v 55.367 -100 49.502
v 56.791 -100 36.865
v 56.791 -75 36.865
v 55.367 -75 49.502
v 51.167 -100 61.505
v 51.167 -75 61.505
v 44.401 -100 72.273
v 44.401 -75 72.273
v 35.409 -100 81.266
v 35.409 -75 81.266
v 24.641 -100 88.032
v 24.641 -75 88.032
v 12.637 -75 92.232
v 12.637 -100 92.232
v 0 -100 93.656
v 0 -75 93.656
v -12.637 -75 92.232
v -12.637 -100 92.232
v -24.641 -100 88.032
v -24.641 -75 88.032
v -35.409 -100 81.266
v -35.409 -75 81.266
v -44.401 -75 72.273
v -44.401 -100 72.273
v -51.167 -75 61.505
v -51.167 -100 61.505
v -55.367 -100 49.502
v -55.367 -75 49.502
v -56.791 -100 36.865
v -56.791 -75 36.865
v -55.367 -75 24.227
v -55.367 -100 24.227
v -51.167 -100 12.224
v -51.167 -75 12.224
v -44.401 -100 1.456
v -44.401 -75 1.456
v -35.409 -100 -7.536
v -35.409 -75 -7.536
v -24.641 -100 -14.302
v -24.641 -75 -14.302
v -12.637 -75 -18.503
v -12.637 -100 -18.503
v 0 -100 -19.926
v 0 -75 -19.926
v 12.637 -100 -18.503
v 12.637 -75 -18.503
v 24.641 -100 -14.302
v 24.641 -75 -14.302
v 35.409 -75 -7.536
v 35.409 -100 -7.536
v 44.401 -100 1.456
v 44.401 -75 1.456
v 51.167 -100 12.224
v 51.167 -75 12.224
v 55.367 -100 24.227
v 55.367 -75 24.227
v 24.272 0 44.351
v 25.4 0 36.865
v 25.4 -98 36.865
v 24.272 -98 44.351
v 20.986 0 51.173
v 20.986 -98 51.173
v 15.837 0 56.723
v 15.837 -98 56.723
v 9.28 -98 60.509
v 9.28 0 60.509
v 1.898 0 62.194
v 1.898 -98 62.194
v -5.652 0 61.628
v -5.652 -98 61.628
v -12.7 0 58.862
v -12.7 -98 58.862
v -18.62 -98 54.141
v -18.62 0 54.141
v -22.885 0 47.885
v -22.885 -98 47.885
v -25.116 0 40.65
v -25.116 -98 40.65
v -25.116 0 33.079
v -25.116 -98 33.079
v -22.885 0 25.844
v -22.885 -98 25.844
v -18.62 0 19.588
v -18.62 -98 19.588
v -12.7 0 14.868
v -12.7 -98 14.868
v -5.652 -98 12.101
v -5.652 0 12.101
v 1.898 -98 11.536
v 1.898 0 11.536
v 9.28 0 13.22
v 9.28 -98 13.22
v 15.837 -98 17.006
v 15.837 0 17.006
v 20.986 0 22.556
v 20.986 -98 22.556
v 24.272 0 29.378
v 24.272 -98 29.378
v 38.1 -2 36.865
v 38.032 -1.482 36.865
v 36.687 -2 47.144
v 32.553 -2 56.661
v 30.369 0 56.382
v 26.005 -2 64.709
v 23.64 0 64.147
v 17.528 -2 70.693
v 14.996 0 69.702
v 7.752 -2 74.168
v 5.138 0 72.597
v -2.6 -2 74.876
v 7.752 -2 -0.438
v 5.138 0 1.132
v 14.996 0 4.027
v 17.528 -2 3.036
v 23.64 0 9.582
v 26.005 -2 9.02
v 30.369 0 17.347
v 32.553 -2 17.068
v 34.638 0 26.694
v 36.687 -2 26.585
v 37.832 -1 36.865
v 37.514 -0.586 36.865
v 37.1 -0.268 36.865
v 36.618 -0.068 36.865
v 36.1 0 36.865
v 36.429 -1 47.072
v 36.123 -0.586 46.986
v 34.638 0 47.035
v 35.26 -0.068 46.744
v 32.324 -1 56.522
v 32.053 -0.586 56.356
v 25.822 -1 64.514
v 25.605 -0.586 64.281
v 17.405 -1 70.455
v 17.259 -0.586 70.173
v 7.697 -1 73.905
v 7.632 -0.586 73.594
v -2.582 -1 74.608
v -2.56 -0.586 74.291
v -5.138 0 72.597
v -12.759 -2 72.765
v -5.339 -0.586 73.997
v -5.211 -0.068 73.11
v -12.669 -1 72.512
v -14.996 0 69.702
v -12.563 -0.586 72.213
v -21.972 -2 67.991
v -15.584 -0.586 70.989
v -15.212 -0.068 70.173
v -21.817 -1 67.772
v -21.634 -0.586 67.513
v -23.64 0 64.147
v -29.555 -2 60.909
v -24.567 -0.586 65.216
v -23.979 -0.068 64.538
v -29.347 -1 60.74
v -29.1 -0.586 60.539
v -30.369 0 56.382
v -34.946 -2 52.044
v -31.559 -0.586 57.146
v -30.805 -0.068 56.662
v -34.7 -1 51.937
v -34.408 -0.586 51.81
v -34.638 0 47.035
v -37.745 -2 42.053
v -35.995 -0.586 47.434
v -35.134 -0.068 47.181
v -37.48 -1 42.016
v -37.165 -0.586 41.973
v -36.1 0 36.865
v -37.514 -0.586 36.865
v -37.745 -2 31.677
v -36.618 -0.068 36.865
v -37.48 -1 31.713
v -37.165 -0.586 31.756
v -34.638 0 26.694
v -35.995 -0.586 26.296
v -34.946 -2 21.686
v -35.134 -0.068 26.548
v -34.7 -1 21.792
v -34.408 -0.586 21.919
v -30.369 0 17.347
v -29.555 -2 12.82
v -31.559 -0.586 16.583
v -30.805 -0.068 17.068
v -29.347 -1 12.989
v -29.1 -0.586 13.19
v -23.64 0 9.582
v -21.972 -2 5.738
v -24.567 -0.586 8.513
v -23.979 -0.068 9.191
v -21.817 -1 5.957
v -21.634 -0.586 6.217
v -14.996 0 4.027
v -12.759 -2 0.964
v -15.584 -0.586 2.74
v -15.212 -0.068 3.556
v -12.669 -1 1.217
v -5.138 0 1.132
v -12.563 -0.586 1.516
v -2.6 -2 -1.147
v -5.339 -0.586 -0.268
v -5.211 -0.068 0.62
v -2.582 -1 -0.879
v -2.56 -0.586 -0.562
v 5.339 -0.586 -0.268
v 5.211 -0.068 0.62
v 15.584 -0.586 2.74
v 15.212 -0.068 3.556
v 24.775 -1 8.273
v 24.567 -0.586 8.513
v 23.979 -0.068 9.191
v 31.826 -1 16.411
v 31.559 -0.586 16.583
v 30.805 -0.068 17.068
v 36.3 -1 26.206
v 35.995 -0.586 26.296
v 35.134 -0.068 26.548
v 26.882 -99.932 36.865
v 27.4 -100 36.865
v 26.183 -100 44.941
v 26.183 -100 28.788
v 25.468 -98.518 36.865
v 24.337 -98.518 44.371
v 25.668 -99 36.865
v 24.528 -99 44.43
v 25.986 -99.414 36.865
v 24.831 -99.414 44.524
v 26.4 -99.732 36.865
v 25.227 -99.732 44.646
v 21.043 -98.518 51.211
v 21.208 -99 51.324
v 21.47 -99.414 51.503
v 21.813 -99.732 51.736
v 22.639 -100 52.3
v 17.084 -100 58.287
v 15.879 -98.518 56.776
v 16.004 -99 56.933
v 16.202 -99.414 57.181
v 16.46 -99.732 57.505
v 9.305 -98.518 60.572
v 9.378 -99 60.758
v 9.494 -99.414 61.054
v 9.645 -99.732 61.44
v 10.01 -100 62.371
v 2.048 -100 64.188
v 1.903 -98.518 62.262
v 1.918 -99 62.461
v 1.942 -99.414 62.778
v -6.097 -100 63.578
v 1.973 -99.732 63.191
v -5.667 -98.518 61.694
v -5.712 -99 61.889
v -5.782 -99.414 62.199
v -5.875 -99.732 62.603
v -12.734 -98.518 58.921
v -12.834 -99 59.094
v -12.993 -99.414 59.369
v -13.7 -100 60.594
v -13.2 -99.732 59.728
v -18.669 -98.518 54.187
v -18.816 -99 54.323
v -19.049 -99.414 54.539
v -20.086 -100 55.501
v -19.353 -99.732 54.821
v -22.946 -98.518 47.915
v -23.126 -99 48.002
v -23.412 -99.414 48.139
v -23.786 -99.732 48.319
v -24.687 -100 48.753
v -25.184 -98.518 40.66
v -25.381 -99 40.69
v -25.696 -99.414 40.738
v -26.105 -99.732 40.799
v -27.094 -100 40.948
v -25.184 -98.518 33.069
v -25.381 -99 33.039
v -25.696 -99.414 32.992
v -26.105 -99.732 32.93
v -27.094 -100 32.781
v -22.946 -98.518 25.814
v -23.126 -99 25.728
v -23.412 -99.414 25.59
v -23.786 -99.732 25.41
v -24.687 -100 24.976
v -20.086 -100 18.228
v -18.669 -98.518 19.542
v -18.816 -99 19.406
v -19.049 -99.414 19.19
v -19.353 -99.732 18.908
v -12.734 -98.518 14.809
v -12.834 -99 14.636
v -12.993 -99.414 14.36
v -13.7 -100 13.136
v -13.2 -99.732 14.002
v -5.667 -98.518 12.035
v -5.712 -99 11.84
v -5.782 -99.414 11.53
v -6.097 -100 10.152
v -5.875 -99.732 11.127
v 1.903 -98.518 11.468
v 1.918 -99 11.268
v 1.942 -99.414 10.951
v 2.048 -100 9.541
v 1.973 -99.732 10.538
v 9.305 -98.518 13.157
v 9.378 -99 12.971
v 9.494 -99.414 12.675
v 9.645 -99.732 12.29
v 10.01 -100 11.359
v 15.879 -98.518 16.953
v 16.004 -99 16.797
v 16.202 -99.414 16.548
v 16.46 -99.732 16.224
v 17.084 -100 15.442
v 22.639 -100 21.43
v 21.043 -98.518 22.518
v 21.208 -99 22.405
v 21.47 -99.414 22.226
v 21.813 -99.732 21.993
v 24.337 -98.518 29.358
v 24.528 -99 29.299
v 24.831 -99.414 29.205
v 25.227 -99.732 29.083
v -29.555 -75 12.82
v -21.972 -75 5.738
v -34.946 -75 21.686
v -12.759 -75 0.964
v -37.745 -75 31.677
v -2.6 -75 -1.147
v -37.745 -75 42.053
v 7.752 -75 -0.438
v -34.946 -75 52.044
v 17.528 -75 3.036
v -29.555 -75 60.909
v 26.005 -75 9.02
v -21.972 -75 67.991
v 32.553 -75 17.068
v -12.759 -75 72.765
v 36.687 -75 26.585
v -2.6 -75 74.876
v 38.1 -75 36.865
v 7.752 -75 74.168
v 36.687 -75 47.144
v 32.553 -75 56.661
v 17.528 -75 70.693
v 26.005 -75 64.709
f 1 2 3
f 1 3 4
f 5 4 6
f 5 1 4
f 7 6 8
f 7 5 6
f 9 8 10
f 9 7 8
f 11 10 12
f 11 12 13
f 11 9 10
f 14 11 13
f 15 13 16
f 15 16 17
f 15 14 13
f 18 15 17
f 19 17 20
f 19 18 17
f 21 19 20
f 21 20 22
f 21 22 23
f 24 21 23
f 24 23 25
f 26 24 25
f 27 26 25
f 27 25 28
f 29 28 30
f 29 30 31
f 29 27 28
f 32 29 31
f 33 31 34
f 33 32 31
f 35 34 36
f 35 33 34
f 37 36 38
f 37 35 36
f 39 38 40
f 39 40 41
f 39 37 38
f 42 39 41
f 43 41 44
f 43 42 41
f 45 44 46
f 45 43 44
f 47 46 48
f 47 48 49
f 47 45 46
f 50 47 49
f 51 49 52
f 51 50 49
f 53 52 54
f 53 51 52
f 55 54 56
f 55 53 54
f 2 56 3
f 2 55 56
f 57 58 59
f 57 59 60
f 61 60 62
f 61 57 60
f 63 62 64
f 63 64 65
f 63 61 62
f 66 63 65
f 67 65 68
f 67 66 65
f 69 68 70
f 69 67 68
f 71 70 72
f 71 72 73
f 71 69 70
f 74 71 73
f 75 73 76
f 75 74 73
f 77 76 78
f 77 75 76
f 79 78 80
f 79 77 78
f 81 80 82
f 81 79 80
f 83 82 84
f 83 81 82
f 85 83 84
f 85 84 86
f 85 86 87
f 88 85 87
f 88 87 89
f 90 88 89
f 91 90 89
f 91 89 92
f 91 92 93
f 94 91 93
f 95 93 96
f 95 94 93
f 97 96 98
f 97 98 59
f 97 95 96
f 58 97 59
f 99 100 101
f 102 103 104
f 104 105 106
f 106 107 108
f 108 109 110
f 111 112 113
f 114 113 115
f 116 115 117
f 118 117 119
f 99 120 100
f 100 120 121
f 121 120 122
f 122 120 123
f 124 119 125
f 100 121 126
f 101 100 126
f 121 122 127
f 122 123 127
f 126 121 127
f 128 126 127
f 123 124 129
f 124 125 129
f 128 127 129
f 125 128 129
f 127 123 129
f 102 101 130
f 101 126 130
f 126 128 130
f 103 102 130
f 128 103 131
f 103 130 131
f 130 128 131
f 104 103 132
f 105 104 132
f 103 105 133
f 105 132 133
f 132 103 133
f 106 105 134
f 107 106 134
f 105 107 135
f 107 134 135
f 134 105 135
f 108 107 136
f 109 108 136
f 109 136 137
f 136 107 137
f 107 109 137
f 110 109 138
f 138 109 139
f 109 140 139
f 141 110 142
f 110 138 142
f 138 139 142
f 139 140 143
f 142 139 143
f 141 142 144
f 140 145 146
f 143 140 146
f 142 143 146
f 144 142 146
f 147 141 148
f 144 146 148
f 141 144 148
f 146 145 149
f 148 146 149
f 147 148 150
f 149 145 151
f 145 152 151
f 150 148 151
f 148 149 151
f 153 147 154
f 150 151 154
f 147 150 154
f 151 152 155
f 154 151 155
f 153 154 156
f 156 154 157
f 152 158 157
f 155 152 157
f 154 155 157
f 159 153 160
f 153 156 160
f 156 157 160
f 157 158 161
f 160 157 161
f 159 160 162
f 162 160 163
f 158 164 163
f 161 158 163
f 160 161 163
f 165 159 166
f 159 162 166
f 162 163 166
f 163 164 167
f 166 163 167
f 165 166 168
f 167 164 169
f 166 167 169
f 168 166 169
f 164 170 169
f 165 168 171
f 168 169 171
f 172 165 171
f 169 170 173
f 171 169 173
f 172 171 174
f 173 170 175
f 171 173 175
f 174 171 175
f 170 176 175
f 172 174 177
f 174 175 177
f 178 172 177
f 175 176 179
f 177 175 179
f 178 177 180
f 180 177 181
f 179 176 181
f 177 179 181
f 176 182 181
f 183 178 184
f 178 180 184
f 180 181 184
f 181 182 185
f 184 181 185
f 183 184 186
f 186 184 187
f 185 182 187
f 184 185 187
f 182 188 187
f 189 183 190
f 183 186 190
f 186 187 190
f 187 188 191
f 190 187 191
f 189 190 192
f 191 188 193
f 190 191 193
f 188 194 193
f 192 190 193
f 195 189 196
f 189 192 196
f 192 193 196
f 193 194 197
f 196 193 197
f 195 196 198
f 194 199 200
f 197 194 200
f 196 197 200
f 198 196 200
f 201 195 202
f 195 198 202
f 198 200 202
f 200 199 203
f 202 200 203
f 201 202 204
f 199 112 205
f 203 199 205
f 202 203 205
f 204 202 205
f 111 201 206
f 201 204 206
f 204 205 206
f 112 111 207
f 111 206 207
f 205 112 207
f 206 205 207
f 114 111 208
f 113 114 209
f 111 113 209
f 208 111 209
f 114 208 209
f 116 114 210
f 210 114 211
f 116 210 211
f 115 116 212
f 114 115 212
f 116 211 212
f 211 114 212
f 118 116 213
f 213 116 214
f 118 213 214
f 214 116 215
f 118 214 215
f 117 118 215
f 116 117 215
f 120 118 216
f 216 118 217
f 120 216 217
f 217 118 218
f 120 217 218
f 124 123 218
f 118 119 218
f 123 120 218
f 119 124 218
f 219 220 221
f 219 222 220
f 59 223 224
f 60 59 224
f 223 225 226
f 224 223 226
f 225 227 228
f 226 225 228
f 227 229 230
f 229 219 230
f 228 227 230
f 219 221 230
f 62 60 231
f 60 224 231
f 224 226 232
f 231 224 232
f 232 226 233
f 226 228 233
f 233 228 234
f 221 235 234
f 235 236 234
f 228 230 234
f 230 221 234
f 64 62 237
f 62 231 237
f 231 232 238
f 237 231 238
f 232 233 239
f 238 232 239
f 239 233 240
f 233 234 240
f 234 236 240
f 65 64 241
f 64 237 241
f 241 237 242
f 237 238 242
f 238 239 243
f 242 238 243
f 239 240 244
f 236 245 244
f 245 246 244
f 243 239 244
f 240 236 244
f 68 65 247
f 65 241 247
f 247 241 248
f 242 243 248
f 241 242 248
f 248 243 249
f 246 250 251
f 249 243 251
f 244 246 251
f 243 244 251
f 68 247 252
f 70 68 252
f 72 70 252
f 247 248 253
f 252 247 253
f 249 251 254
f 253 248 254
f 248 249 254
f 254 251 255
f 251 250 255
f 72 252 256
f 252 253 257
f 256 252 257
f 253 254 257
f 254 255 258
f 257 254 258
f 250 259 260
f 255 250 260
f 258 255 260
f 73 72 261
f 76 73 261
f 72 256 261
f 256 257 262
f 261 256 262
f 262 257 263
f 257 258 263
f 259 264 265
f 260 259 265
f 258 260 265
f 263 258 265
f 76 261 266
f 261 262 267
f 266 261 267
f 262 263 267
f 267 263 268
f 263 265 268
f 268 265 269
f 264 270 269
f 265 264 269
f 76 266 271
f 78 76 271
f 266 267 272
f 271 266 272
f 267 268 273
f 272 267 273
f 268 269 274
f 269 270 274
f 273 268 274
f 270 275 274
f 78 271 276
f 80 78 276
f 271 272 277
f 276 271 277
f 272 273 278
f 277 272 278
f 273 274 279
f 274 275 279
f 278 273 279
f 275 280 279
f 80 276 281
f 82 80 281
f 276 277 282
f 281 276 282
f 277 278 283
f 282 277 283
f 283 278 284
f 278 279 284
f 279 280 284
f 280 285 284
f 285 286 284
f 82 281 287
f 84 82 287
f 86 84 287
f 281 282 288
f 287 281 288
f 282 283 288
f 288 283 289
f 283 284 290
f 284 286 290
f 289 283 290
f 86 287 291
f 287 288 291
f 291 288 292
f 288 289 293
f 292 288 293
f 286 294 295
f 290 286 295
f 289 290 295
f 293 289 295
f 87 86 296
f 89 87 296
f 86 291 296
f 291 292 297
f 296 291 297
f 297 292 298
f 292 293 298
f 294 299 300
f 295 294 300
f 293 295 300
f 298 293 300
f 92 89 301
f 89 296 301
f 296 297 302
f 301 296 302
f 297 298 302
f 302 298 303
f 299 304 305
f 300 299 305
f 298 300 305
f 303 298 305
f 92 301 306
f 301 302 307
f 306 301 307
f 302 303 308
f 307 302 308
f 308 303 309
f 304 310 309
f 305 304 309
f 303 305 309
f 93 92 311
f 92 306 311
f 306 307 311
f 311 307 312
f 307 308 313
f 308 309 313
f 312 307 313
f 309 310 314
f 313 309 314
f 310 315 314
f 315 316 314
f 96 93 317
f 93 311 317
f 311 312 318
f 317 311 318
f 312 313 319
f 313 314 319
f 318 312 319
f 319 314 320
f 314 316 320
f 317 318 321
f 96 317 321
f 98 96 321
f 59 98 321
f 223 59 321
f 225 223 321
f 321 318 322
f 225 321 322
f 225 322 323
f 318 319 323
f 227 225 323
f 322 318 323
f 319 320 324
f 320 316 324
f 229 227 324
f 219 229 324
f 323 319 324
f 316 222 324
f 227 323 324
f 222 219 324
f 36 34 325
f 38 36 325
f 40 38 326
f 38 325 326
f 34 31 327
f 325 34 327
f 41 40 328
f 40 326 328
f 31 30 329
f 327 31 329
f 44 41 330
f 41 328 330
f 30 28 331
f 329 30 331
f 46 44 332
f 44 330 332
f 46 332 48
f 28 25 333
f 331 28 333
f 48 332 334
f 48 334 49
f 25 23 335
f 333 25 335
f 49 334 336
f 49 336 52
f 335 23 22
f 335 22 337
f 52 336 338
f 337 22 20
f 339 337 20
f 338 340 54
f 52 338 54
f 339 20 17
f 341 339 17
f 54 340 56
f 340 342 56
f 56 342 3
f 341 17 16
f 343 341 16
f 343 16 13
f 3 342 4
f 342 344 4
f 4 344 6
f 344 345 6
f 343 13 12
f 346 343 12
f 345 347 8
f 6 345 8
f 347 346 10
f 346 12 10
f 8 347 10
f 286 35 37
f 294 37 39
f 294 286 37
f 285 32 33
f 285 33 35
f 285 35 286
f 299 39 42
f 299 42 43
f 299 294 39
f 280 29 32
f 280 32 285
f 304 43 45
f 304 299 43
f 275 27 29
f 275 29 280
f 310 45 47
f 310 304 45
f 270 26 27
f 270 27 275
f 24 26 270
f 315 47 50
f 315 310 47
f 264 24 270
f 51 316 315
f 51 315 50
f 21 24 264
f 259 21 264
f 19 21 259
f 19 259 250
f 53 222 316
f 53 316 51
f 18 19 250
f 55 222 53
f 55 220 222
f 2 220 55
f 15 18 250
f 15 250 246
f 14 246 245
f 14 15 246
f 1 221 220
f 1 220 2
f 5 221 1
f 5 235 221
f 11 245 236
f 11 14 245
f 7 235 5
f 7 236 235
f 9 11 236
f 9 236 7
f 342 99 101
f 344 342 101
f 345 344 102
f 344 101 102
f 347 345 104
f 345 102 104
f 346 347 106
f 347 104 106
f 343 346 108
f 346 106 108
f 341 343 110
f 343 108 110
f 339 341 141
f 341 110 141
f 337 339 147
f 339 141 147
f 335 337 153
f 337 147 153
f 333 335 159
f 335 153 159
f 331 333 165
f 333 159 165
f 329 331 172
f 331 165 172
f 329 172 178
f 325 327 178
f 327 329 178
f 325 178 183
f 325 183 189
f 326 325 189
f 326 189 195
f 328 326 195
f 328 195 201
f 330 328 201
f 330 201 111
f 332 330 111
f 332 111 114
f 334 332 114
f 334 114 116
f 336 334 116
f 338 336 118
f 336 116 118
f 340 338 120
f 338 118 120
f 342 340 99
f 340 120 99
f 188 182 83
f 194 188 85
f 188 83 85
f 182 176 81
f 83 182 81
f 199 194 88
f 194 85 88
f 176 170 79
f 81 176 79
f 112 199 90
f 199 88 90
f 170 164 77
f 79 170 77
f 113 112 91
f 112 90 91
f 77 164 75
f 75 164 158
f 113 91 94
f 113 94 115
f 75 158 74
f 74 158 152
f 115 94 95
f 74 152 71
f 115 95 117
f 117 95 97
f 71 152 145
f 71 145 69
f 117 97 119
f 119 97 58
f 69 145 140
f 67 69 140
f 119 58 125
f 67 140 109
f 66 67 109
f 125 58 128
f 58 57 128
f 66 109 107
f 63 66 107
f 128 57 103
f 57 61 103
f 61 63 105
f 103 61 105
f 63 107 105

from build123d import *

# Parameters (mm, degrees)
F0_R     = 38.1
F0_R_2   = 25.4
F1_DEPTH = 100
F2_R     = 56.791086
F2_R_2   = 25.414512
F3_DEPTH = 25
F4_R     = 2
F5_R     = 2


with BuildPart() as f1:
    # F0 (on Front) → F1 (new body)
    with BuildSketch(Plane.XZ):
        with Locations((0, 36.864621)):
            Circle(F0_R)
        with Locations((0, 36.864621)):
            Circle(F0_R_2, mode=Mode.SUBTRACT)
    extrude(amount=F1_DEPTH)

    # F2 (on face) → F3 (join)
    with BuildSketch(Plane.XZ.offset(100)):
        with Locations((0, 36.864621)):
            Circle(F2_R)
        with Locations((0, 36.864621)):
            Circle(F2_R_2, mode=Mode.SUBTRACT)
    extrude(amount=-F3_DEPTH)

    # F4
    f4_edges = [f1.edges().sort_by_distance(p)[0] for p in [
        (-38.1, 0, 36.864621),
    ]]
    fillet(f4_edges, radius=F4_R)

    # F5
    f5_edges = [f1.edges().sort_by_distance(p)[0] for p in [
        (-25.4, -100, 36.864621),
    ]]
    fillet(f5_edges, radius=F5_R)


solid = f1.part
